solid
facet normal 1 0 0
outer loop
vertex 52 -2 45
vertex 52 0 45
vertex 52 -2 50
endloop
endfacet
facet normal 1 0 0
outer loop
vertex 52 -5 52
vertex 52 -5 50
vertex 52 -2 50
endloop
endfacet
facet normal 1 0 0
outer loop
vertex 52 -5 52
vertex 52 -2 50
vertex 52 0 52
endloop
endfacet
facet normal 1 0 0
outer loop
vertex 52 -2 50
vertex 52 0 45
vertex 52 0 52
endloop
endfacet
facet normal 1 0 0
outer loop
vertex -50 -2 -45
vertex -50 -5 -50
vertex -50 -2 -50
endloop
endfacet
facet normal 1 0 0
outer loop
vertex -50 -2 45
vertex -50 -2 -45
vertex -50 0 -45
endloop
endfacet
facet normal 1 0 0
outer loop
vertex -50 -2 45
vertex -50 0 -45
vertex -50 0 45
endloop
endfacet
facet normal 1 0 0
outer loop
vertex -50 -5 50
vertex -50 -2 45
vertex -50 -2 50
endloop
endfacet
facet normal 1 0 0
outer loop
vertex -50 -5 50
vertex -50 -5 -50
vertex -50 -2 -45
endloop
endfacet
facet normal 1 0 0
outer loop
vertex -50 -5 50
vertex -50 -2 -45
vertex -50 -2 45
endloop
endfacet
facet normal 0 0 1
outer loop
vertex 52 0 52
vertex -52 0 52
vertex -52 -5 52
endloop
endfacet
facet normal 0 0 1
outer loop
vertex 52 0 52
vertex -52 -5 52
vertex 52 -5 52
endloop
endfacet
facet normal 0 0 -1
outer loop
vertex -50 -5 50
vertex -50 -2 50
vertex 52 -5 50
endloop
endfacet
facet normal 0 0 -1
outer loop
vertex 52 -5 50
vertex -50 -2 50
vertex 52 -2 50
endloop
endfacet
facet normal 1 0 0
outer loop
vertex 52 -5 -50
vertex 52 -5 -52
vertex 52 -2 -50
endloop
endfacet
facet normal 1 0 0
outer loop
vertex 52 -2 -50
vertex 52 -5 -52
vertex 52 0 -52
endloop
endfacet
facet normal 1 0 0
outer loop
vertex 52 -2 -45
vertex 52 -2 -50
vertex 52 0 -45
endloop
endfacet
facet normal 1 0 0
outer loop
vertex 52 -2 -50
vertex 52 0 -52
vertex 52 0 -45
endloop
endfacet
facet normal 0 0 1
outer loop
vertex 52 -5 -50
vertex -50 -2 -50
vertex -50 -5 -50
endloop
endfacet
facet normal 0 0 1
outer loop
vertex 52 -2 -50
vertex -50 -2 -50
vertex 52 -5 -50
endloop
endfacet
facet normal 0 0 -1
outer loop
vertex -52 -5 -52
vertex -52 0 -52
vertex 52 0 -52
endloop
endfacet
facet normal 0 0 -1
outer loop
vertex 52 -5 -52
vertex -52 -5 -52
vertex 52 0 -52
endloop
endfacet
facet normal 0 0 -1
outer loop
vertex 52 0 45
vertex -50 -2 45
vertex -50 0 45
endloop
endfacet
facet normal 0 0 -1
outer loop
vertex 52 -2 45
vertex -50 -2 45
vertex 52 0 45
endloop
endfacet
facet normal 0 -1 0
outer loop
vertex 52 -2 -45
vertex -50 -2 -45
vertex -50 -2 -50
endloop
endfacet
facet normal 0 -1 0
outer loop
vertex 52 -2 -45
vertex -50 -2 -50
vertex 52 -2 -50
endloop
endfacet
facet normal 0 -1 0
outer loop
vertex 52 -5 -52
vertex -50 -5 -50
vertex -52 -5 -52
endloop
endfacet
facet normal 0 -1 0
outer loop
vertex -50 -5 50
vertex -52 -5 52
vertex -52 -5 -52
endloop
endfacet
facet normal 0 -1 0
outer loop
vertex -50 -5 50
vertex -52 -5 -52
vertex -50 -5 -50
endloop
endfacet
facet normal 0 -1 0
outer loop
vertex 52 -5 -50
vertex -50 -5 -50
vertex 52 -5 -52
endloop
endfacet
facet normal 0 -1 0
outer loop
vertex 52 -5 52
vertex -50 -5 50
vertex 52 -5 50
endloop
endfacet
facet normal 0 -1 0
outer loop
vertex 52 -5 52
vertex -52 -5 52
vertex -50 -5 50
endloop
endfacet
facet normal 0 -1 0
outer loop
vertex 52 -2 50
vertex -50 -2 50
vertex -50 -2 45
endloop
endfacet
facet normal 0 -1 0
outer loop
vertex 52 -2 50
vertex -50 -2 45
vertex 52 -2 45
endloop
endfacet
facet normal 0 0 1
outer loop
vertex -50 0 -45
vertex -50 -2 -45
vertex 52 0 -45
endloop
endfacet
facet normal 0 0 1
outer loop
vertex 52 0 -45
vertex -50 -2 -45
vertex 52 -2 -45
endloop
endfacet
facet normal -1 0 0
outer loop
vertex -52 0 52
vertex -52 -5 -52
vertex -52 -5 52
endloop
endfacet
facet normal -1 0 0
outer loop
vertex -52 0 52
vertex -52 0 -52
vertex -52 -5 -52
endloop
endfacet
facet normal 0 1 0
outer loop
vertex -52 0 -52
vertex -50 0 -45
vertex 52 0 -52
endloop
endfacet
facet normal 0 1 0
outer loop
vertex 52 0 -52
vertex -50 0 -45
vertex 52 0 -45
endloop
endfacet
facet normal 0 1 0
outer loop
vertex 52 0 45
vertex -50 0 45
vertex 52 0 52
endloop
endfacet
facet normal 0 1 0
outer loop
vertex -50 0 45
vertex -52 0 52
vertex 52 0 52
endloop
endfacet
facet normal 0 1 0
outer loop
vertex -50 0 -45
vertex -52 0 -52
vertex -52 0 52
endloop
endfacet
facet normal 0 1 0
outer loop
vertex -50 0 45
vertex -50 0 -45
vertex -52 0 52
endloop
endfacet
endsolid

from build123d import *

# Parameters (mm, degrees)
F0_W      = 104
F0_H      = 104
F1_DEPTH  = 2
F2_W      = 104
F2_H      = 2
F3_DEPTH  = 3
F4_W      = 2
F4_H      = 102
F5_DEPTH  = 3
F6_W      = 102
F6_H      = 2
F7_DEPTH  = 3
F10_W     = 102
F10_H     = 90
F11_DEPTH = 25


with BuildPart() as f1:
    # F0 (on Front) → F1 (new body)
    with BuildSketch(Plane.XZ):
        Rectangle(F0_W, F0_H)
    extrude(amount=F1_DEPTH)

    # F2 (on face) → F3 (join)
    with BuildSketch(Plane.XZ.offset(2)):
        with Locations((0, 51)):
            Rectangle(F2_W, F2_H)
    extrude(amount=F3_DEPTH)

    # F4 (on face) → F5 (join)
    with BuildSketch(Plane.XZ.offset(2)):
        with Locations((-51, -1)):
            Rectangle(F4_W, F4_H)
    extrude(amount=F5_DEPTH)

    # F6 (on face) → F7 (join)
    with BuildSketch(Plane.XZ.offset(2)):
        with Locations((1, -51)):
            Rectangle(F6_W, F6_H)
    extrude(amount=F7_DEPTH)

    # F10 (on face) → F11 (cut)
    with BuildSketch(Plane.XZ.offset(2)):
        with Locations((1, 0)):
            Rectangle(F10_W, F10_H)
    extrude(amount=-F11_DEPTH, mode=Mode.SUBTRACT)


solid = f1.part
